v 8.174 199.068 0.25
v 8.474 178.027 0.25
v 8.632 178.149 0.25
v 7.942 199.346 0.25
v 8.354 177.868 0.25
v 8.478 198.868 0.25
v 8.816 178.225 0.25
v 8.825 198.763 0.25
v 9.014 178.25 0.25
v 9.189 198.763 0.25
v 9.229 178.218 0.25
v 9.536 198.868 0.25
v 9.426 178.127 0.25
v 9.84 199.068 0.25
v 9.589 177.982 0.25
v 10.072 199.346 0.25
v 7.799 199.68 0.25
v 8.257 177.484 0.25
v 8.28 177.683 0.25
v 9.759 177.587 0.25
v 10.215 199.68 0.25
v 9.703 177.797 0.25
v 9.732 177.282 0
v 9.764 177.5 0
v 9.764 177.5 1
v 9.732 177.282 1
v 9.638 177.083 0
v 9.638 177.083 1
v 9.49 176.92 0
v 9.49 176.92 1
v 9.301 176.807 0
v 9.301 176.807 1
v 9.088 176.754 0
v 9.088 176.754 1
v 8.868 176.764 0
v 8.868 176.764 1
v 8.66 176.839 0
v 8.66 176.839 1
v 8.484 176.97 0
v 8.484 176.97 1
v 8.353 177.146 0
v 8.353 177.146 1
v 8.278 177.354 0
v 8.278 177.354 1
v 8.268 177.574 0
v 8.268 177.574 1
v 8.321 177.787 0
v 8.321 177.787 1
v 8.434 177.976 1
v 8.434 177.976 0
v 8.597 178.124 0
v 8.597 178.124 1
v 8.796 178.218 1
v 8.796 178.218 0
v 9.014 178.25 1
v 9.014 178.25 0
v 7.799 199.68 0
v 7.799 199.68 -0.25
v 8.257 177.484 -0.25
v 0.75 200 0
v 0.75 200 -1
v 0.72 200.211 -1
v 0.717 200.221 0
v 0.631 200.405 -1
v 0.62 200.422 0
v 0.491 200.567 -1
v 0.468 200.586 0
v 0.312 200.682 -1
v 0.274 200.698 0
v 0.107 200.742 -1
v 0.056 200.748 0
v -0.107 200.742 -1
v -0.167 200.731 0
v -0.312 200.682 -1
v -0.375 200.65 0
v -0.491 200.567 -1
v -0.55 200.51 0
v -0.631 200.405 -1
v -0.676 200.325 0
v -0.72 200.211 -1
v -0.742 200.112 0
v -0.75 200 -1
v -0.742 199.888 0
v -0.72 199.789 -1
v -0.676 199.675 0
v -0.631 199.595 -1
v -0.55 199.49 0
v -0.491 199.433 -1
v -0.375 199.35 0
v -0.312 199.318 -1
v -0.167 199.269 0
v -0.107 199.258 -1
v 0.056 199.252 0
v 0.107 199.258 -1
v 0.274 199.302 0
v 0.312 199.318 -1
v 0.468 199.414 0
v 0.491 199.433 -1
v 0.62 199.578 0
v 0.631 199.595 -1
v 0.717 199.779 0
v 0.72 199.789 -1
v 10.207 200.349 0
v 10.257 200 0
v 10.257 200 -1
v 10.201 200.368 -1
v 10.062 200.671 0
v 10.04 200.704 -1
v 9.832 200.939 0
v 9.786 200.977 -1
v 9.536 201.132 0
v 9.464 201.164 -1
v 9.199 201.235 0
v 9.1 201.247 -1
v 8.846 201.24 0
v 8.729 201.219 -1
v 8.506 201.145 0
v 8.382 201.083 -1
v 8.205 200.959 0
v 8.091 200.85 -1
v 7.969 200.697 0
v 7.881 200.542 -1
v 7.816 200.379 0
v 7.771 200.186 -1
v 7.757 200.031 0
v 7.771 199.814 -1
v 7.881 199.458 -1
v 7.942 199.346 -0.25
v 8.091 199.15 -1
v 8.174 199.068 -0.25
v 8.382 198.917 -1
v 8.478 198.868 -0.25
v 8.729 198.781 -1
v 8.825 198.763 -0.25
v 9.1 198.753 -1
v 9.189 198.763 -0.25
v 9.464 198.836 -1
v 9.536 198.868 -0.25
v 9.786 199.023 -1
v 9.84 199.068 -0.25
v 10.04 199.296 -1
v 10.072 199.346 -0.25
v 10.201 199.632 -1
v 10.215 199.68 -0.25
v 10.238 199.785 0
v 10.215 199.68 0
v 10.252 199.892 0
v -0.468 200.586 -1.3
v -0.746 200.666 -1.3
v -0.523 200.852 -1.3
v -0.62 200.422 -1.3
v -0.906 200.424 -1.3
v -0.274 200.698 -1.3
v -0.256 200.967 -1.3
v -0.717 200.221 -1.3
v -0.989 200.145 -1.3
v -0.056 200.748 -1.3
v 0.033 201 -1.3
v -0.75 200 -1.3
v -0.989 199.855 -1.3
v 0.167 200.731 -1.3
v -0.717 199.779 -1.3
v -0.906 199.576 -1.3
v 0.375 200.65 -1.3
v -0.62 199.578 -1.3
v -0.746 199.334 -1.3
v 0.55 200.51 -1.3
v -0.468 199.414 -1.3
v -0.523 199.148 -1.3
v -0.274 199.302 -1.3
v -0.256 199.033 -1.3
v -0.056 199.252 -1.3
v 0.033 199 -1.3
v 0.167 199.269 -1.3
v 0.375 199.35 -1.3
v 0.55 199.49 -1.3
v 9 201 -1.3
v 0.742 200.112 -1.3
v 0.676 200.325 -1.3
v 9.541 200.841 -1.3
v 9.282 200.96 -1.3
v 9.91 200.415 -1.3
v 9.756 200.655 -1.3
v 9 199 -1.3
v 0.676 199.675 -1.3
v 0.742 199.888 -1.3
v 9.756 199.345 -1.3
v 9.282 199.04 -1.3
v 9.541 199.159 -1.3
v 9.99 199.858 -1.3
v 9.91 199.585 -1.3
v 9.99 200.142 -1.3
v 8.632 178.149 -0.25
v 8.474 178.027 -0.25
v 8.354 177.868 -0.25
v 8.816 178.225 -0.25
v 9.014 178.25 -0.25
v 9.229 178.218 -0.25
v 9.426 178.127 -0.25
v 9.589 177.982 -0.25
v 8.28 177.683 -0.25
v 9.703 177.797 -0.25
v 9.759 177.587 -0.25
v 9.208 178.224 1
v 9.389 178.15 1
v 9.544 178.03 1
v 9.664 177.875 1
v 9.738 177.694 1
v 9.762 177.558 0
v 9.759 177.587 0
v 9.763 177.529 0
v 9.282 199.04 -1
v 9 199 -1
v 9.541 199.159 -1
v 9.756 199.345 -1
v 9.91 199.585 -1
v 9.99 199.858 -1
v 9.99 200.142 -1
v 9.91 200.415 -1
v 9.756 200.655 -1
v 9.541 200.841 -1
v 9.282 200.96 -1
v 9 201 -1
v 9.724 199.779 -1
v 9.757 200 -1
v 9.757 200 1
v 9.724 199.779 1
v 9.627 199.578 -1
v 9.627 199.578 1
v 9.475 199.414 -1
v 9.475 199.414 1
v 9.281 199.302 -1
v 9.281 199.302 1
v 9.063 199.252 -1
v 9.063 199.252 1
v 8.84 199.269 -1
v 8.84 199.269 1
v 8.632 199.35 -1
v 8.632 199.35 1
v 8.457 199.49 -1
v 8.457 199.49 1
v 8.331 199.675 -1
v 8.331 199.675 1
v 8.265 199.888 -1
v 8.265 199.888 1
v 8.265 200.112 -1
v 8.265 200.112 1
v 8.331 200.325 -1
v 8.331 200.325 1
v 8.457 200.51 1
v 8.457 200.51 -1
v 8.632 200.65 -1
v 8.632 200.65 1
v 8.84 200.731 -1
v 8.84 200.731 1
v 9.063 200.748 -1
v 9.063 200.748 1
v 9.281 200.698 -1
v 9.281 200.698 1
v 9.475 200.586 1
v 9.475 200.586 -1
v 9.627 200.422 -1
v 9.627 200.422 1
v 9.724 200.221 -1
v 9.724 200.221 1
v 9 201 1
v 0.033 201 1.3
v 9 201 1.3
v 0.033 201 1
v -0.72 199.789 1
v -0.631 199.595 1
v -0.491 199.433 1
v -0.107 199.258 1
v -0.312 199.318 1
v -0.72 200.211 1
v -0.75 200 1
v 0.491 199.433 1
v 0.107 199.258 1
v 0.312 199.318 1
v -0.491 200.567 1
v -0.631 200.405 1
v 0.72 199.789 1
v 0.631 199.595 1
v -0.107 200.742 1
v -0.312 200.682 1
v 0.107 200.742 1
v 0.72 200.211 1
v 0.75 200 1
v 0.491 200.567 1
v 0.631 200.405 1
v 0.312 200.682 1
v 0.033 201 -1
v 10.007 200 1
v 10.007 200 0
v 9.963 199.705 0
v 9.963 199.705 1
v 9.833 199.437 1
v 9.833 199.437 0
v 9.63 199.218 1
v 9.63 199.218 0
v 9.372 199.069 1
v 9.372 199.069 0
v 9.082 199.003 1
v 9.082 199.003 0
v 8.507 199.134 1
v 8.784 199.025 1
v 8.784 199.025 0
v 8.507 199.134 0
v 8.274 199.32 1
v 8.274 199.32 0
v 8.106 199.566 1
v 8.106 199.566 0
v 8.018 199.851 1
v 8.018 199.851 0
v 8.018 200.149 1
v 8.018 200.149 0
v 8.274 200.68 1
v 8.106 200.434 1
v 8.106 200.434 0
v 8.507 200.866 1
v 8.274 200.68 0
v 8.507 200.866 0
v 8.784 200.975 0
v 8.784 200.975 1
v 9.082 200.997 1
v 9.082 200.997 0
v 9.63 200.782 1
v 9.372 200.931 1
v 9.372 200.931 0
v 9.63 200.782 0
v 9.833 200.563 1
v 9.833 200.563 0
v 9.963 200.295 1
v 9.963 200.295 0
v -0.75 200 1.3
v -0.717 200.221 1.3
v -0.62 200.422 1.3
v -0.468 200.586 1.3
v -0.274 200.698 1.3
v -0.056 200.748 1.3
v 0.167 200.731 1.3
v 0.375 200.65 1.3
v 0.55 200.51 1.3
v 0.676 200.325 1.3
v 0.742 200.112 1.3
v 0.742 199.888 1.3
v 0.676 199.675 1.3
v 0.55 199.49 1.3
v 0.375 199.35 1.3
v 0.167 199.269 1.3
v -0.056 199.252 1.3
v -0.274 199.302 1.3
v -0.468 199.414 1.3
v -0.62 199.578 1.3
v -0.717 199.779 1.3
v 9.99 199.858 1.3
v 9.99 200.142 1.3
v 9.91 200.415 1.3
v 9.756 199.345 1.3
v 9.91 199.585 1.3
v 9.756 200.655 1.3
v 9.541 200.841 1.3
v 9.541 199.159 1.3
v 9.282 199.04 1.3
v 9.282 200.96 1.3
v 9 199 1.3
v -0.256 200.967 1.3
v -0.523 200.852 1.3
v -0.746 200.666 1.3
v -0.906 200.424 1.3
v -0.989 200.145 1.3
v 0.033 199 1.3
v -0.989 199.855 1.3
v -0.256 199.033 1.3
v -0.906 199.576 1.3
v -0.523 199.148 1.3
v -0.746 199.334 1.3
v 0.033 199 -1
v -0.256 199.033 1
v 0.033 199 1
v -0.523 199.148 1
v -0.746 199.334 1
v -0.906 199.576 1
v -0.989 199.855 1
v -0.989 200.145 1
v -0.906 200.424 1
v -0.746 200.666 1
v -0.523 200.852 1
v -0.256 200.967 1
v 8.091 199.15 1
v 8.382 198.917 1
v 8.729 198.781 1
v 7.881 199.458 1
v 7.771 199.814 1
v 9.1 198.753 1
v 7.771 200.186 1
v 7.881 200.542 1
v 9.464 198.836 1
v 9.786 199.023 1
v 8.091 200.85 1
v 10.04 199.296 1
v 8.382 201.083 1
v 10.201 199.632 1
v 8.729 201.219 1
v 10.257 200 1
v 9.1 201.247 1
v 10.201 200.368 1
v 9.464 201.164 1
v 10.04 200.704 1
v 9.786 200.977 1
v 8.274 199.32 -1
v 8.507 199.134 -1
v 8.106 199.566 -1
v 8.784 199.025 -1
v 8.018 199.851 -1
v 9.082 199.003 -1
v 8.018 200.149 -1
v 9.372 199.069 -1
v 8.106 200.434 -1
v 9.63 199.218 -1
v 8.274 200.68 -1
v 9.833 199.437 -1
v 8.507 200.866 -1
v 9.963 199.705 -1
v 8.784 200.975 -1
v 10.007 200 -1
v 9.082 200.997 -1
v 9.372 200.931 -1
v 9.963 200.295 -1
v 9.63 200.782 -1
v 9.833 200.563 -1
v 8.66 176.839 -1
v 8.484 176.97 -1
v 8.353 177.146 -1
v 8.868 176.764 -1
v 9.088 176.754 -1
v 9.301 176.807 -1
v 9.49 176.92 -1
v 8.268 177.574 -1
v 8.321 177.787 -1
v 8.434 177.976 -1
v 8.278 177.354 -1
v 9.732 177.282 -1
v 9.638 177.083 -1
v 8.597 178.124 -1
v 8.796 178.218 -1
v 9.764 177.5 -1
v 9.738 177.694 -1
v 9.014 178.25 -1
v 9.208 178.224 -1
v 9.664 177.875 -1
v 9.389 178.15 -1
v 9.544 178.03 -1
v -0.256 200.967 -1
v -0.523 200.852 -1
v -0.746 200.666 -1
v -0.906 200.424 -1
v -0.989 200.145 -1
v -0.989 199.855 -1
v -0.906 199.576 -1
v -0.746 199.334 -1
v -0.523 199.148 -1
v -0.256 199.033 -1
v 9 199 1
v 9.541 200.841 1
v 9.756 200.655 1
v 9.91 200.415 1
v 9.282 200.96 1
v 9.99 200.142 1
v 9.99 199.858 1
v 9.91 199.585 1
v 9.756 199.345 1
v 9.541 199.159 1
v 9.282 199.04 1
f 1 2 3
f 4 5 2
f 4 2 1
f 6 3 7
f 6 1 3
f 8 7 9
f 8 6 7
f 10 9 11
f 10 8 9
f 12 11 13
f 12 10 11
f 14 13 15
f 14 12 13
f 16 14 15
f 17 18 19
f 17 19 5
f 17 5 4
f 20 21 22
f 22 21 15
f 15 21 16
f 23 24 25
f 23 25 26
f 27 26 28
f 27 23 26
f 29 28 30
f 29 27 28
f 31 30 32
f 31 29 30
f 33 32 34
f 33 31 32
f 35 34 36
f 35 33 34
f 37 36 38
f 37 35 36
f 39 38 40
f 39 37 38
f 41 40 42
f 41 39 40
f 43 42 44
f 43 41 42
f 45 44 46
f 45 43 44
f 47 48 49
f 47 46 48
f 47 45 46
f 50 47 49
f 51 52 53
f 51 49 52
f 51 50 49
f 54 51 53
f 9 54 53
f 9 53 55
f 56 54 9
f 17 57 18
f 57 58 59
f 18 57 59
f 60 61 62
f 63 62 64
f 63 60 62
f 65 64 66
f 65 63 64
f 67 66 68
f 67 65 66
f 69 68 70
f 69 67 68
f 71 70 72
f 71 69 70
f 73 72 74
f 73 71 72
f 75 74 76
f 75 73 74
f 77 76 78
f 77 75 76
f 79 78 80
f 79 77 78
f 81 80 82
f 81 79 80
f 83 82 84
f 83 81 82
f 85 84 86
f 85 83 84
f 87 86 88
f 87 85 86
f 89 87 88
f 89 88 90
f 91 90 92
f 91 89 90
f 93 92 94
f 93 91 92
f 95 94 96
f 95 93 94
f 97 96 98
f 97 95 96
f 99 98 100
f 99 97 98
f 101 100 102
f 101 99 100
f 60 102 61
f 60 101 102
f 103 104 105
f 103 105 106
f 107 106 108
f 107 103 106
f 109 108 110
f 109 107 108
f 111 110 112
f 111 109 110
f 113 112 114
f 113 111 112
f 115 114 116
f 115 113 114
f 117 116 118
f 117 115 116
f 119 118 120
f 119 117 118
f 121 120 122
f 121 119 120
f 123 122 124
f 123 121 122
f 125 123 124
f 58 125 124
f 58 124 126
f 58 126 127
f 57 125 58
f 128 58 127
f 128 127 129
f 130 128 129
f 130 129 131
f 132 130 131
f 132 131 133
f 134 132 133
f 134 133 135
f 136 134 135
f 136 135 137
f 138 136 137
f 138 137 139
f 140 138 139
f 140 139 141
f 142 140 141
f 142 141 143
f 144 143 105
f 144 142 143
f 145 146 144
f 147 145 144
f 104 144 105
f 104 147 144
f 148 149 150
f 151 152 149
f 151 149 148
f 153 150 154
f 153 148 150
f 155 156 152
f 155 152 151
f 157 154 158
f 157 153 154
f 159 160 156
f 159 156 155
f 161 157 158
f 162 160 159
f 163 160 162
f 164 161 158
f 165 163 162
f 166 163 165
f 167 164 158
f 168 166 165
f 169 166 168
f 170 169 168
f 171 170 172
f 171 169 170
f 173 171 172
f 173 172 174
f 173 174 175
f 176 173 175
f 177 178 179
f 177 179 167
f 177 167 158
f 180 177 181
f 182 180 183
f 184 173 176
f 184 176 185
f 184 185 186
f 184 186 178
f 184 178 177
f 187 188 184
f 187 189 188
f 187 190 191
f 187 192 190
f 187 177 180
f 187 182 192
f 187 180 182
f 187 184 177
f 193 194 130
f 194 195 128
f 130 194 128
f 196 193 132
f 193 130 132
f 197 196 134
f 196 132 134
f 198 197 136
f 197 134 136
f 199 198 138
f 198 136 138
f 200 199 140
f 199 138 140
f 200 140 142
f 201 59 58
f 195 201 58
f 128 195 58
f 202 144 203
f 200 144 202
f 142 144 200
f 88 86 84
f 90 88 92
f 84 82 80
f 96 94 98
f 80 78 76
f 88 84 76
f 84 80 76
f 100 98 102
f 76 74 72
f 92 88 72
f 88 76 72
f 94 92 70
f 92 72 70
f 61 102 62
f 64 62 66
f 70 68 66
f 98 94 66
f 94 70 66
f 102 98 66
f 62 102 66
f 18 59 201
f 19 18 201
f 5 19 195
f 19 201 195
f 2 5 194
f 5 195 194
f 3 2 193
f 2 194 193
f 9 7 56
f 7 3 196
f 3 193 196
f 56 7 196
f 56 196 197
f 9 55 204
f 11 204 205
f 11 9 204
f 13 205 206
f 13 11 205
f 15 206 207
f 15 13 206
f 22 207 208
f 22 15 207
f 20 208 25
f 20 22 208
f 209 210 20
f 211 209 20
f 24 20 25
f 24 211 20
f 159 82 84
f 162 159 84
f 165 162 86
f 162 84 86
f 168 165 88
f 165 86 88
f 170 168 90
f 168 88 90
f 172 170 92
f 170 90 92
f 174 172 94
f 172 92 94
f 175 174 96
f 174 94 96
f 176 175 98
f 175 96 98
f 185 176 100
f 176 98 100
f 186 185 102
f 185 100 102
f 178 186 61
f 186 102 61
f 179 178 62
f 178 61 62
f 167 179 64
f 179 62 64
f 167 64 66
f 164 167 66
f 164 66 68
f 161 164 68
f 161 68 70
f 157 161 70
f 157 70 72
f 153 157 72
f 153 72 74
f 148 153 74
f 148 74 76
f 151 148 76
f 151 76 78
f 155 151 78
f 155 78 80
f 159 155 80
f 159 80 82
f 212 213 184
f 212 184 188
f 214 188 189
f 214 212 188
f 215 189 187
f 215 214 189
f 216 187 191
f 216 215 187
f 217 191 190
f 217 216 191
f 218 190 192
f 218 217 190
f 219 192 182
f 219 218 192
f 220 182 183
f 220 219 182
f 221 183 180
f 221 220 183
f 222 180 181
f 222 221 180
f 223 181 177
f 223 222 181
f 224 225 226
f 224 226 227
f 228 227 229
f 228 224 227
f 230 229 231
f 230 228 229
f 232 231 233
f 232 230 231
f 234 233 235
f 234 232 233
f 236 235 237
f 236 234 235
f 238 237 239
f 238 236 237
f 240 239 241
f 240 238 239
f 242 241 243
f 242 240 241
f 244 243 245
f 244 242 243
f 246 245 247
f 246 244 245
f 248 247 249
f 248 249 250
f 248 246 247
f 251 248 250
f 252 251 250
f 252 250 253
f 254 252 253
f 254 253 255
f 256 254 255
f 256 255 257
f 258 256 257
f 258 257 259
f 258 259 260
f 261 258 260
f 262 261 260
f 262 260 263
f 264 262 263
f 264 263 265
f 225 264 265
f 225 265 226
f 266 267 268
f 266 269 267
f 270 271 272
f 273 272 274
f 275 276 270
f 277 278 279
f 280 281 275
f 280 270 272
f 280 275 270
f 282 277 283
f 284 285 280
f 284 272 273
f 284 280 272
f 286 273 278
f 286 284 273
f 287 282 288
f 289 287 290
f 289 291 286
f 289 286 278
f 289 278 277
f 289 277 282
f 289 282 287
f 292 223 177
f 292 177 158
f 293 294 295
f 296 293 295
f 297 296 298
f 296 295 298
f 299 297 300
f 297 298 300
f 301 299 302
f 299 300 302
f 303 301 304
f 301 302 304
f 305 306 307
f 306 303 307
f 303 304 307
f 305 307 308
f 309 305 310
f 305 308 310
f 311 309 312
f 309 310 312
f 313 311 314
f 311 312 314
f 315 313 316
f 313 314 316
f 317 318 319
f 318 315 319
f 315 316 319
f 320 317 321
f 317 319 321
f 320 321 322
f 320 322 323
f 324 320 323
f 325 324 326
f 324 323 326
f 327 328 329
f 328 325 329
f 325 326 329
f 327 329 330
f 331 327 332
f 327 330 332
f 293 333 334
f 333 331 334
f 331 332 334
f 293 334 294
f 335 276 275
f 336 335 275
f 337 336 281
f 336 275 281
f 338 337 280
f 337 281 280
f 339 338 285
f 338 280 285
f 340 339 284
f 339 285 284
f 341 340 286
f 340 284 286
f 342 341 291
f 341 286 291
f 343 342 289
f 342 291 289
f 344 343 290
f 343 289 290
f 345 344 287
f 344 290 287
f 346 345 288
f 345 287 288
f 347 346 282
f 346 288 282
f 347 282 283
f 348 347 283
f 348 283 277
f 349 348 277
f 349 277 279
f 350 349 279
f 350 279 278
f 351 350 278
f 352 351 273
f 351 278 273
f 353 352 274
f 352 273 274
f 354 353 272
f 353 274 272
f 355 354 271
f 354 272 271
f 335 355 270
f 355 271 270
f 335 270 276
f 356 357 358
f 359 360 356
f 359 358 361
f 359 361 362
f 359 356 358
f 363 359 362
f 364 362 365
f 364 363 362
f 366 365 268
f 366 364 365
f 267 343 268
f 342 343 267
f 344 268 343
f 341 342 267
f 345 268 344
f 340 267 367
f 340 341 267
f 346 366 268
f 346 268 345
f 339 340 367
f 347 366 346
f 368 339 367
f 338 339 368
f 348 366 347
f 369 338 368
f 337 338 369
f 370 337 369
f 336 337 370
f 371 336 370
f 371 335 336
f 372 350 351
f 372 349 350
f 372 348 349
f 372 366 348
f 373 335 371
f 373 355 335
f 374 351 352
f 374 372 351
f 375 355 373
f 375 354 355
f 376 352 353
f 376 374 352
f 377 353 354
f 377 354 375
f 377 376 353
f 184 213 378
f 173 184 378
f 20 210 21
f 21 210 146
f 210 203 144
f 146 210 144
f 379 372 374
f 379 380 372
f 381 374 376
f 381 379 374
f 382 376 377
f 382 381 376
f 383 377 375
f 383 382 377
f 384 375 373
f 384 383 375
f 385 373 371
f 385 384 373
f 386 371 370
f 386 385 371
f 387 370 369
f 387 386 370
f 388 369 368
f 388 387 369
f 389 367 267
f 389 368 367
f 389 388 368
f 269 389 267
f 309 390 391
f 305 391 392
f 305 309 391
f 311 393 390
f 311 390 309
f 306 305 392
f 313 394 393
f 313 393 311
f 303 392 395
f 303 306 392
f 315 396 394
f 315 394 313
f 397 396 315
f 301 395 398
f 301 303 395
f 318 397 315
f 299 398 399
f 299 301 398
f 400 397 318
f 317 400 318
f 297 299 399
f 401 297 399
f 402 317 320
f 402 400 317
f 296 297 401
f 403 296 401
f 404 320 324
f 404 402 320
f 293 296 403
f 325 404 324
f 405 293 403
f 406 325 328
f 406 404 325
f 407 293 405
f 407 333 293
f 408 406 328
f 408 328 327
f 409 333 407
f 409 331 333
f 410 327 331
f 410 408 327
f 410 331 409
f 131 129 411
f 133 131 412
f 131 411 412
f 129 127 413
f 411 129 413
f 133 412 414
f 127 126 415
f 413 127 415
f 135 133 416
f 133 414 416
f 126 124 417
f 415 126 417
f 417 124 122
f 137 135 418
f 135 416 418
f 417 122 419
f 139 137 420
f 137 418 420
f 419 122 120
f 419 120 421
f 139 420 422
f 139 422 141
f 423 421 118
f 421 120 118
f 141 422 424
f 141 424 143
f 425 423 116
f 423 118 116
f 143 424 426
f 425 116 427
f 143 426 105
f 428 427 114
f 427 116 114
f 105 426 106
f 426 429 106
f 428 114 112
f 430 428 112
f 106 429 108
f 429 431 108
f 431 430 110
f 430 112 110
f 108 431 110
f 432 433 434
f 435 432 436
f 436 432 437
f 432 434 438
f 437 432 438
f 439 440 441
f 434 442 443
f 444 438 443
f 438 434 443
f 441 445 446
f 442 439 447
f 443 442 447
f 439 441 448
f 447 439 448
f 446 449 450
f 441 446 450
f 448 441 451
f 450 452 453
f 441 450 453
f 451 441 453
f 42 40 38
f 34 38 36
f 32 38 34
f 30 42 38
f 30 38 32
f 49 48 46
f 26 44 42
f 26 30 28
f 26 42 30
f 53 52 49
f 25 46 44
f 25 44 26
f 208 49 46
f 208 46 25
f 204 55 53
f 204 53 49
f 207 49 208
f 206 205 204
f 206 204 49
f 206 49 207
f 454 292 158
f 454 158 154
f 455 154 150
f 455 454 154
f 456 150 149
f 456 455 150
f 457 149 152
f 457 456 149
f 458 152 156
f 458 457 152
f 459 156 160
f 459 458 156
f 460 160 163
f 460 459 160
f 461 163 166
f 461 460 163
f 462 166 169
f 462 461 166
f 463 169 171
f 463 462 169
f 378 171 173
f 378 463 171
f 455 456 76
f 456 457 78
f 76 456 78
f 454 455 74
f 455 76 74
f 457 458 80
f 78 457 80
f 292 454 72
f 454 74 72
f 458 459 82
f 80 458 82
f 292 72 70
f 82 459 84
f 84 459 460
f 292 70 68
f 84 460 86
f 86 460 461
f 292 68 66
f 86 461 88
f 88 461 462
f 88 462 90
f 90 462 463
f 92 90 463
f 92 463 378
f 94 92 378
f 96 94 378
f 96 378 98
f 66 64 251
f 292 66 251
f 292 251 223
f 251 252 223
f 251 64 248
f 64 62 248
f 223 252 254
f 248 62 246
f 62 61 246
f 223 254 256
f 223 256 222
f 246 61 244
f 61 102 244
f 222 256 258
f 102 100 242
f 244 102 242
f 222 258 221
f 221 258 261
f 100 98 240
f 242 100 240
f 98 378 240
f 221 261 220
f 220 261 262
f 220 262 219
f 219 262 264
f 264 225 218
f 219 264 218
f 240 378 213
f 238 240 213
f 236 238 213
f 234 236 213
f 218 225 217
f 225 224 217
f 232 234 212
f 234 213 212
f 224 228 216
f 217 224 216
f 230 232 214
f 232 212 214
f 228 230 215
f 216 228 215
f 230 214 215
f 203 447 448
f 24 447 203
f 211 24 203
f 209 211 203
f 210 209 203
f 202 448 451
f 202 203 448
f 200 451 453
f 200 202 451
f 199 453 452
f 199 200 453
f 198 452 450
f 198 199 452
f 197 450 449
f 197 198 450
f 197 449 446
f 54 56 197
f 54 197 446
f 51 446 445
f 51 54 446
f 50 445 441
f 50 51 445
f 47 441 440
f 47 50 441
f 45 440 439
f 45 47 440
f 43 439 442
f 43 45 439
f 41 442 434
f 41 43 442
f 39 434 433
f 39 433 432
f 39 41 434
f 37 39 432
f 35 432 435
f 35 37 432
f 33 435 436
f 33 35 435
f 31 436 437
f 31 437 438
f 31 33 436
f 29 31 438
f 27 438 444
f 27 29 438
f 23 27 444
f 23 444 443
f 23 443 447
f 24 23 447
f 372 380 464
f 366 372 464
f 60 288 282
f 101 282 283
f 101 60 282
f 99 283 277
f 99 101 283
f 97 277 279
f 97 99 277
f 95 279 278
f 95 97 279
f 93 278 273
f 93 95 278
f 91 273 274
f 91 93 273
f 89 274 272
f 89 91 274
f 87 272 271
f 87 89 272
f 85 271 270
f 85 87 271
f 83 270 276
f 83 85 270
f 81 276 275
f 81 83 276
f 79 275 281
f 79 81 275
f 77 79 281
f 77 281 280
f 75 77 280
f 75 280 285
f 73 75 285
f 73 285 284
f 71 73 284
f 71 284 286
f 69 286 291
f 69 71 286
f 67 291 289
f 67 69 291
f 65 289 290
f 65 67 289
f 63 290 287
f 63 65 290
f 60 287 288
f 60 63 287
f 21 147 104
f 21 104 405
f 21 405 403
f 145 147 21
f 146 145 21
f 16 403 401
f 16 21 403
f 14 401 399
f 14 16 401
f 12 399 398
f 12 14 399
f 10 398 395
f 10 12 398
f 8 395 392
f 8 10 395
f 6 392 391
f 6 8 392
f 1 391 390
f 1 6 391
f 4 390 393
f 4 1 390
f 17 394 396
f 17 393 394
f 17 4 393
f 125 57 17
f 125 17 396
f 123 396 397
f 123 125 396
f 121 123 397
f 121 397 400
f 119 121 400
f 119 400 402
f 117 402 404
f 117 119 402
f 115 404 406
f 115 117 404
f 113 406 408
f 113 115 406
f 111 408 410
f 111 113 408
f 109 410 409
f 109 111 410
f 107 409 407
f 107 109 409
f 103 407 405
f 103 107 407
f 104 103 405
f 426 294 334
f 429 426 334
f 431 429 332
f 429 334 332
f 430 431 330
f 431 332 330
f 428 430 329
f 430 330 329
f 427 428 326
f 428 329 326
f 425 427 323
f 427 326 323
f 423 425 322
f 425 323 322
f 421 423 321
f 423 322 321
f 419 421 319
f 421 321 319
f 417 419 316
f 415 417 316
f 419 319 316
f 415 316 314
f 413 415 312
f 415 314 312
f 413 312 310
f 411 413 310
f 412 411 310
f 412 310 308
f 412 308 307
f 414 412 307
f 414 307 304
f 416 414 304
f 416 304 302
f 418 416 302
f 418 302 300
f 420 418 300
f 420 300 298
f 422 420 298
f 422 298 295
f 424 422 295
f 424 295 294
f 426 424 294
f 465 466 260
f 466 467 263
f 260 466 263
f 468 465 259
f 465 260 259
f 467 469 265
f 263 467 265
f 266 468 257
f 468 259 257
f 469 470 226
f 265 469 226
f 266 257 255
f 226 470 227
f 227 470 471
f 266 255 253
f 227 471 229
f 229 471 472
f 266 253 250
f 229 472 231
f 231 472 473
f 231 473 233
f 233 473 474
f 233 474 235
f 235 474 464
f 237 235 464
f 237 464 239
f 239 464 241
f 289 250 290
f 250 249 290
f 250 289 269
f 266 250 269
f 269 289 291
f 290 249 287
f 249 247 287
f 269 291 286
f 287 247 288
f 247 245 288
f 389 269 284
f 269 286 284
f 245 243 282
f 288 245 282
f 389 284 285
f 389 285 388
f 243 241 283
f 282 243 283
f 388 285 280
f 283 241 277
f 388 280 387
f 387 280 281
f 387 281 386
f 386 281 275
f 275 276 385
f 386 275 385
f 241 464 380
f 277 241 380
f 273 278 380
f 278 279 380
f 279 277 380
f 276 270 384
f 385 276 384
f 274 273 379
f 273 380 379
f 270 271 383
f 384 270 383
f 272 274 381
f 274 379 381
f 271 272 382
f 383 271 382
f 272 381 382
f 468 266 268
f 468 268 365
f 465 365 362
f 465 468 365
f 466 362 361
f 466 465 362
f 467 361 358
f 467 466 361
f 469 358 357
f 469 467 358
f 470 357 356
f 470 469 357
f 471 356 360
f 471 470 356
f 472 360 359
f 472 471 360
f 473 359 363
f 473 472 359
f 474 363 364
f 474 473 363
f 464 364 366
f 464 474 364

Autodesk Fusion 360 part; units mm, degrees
sketch "草图1" plane through (0, 0, 0) normal (0, 0, 1) x (1, 0, 0)
  circle A0 centre (0, 200) radius 0.75
  line L0 (0, 200) -> (9.007, 200)
  circle A1 centre (9.007, 200) radius 0.75
  dimension "d1" = 1.5
  dimension "d3" = 9.007
  dimension "d5" = 1.5
extrude "拉伸1" add sketch "草图1" along normal mid plane 2 makes body 1 at (-0.64, 199.6089, 0.6667) makes body 2 at (9.6657, 200.3587, -0.3333)
sketch "草图2" plane through (0, 0, 1) normal (0, 0, 1) x (-1, 0, 0)
  circle A0 centre (0, -200) radius 0.75
  line L0 (-0.0328, -200.9995) -> (-9, -201)
  line L1 (-0.0328, -199.0005) -> (-9, -199)
  arc A1 (-0.0328, -200.9995) -> (-0.0328, -199.0005) centre (0, -200) ccw
  arc A2 (-9, -199) -> (-9, -201) centre (-9.0001, -200) ccw
  dimension "d8" = 2
  dimension "d9" = 2
extrude "拉伸2" add sketch "草图2" along normal blind 0.3 bodies 2 1
mirror "镜像1" about plane through (0, 0, 0) normal (0, 0, 1) of "拉伸2"
copy_body "实体->零部件1" bodies 2 removing the originals makes body 3 in component "Component"
sketch "草图3" plane through (0, 0, 1.3) normal (0, 0, 1) x (-1, 0, 0)
  circle A0 centre (0, -200) radius 0.75
  arc A1 (-0.0328, -200.9995) -> (-0.0328, -199.0005) centre (0, -200) ccw
  line L0 (-0.0328, -199.0005) -> (-9, -199)
  arc A2 (-9, -199) -> (-9, -201) centre (-9.0001, -200) ccw
  line L1 (-9, -201) -> (-0.0328, -200.9995)
  dimension "d14" = 9.0001
sketch "草图4" plane through (0, 0, 0) normal (0, 0, 1) x (1, 0, 0)
  line L0 (20, 200) -> (20.007, 200)
  line L1 (20.007, 200) -> (20.007, 177.5)
  circle A0 centre (20.007, 177.5) radius 0.75
  dimension "d17" = 0.007
  dimension "d18" = 22.5
  dimension "d19" = 1.5
sketch "草图5" plane through (0, 0, 0) normal (0, 0, 1) x (1, 0, 0)
sketch "草图6" plane through (0, 0, 0) normal (0, 0, 1) x (1, 0, 0)
sketch "草图7" plane through (0, 0, 0) normal (0, 0, 1) x (1, 0, 0)
sketch "草图8" plane through (0, 0, 0) normal (0, 0, 1) x (1, 0, 0)
  circle A0 centre (20, 200) radius 1
  circle A1 centre (20, 200) radius 1.25
  dimension "d22" = 2
  dimension "d23" = 2.5
extrude "拉伸3" add sketch "草图4" sketch "草图8" along normal mid plane 2 separate body of sketch 2 makes body 4 at (20.7345, 177.3178, 0.6667) makes body 5 at (21.1746, 199.5725, 0.6667)
sketch "草图9" plane through (0, 0, 0) normal (0, 0, 1) x (1, 0, 0)
  circle A0 centre (20, 200) radius 1.25
  circle A1 centre (20, 177.5) radius 0.75
  line L0 (18.7917, 199.68) -> (19.2502, 177.4845)
  line L1 (20.7498, 177.4845) -> (21.2083, 199.68)
  dimension "d26" = 2.5
  dimension "d27" = 1.5
extrude "拉伸4" add sketch "草图9" along normal mid plane 0.5 contours A0 A1 L0 L1 bodies 4 5
copy_body "实体->零部件2" bodies 4 removing the originals makes body 6 in component "Component'"
component "Component" placed x (1, 0, 0) y (0, 1, 0) z (0, 0, 1) at (0, 0, 0)
component "Component'" placed x (1, 0, 0) y (0, 1, 0) z (0, 0, 1) at (-10.993, 0, 0)
properties part number "connection"
